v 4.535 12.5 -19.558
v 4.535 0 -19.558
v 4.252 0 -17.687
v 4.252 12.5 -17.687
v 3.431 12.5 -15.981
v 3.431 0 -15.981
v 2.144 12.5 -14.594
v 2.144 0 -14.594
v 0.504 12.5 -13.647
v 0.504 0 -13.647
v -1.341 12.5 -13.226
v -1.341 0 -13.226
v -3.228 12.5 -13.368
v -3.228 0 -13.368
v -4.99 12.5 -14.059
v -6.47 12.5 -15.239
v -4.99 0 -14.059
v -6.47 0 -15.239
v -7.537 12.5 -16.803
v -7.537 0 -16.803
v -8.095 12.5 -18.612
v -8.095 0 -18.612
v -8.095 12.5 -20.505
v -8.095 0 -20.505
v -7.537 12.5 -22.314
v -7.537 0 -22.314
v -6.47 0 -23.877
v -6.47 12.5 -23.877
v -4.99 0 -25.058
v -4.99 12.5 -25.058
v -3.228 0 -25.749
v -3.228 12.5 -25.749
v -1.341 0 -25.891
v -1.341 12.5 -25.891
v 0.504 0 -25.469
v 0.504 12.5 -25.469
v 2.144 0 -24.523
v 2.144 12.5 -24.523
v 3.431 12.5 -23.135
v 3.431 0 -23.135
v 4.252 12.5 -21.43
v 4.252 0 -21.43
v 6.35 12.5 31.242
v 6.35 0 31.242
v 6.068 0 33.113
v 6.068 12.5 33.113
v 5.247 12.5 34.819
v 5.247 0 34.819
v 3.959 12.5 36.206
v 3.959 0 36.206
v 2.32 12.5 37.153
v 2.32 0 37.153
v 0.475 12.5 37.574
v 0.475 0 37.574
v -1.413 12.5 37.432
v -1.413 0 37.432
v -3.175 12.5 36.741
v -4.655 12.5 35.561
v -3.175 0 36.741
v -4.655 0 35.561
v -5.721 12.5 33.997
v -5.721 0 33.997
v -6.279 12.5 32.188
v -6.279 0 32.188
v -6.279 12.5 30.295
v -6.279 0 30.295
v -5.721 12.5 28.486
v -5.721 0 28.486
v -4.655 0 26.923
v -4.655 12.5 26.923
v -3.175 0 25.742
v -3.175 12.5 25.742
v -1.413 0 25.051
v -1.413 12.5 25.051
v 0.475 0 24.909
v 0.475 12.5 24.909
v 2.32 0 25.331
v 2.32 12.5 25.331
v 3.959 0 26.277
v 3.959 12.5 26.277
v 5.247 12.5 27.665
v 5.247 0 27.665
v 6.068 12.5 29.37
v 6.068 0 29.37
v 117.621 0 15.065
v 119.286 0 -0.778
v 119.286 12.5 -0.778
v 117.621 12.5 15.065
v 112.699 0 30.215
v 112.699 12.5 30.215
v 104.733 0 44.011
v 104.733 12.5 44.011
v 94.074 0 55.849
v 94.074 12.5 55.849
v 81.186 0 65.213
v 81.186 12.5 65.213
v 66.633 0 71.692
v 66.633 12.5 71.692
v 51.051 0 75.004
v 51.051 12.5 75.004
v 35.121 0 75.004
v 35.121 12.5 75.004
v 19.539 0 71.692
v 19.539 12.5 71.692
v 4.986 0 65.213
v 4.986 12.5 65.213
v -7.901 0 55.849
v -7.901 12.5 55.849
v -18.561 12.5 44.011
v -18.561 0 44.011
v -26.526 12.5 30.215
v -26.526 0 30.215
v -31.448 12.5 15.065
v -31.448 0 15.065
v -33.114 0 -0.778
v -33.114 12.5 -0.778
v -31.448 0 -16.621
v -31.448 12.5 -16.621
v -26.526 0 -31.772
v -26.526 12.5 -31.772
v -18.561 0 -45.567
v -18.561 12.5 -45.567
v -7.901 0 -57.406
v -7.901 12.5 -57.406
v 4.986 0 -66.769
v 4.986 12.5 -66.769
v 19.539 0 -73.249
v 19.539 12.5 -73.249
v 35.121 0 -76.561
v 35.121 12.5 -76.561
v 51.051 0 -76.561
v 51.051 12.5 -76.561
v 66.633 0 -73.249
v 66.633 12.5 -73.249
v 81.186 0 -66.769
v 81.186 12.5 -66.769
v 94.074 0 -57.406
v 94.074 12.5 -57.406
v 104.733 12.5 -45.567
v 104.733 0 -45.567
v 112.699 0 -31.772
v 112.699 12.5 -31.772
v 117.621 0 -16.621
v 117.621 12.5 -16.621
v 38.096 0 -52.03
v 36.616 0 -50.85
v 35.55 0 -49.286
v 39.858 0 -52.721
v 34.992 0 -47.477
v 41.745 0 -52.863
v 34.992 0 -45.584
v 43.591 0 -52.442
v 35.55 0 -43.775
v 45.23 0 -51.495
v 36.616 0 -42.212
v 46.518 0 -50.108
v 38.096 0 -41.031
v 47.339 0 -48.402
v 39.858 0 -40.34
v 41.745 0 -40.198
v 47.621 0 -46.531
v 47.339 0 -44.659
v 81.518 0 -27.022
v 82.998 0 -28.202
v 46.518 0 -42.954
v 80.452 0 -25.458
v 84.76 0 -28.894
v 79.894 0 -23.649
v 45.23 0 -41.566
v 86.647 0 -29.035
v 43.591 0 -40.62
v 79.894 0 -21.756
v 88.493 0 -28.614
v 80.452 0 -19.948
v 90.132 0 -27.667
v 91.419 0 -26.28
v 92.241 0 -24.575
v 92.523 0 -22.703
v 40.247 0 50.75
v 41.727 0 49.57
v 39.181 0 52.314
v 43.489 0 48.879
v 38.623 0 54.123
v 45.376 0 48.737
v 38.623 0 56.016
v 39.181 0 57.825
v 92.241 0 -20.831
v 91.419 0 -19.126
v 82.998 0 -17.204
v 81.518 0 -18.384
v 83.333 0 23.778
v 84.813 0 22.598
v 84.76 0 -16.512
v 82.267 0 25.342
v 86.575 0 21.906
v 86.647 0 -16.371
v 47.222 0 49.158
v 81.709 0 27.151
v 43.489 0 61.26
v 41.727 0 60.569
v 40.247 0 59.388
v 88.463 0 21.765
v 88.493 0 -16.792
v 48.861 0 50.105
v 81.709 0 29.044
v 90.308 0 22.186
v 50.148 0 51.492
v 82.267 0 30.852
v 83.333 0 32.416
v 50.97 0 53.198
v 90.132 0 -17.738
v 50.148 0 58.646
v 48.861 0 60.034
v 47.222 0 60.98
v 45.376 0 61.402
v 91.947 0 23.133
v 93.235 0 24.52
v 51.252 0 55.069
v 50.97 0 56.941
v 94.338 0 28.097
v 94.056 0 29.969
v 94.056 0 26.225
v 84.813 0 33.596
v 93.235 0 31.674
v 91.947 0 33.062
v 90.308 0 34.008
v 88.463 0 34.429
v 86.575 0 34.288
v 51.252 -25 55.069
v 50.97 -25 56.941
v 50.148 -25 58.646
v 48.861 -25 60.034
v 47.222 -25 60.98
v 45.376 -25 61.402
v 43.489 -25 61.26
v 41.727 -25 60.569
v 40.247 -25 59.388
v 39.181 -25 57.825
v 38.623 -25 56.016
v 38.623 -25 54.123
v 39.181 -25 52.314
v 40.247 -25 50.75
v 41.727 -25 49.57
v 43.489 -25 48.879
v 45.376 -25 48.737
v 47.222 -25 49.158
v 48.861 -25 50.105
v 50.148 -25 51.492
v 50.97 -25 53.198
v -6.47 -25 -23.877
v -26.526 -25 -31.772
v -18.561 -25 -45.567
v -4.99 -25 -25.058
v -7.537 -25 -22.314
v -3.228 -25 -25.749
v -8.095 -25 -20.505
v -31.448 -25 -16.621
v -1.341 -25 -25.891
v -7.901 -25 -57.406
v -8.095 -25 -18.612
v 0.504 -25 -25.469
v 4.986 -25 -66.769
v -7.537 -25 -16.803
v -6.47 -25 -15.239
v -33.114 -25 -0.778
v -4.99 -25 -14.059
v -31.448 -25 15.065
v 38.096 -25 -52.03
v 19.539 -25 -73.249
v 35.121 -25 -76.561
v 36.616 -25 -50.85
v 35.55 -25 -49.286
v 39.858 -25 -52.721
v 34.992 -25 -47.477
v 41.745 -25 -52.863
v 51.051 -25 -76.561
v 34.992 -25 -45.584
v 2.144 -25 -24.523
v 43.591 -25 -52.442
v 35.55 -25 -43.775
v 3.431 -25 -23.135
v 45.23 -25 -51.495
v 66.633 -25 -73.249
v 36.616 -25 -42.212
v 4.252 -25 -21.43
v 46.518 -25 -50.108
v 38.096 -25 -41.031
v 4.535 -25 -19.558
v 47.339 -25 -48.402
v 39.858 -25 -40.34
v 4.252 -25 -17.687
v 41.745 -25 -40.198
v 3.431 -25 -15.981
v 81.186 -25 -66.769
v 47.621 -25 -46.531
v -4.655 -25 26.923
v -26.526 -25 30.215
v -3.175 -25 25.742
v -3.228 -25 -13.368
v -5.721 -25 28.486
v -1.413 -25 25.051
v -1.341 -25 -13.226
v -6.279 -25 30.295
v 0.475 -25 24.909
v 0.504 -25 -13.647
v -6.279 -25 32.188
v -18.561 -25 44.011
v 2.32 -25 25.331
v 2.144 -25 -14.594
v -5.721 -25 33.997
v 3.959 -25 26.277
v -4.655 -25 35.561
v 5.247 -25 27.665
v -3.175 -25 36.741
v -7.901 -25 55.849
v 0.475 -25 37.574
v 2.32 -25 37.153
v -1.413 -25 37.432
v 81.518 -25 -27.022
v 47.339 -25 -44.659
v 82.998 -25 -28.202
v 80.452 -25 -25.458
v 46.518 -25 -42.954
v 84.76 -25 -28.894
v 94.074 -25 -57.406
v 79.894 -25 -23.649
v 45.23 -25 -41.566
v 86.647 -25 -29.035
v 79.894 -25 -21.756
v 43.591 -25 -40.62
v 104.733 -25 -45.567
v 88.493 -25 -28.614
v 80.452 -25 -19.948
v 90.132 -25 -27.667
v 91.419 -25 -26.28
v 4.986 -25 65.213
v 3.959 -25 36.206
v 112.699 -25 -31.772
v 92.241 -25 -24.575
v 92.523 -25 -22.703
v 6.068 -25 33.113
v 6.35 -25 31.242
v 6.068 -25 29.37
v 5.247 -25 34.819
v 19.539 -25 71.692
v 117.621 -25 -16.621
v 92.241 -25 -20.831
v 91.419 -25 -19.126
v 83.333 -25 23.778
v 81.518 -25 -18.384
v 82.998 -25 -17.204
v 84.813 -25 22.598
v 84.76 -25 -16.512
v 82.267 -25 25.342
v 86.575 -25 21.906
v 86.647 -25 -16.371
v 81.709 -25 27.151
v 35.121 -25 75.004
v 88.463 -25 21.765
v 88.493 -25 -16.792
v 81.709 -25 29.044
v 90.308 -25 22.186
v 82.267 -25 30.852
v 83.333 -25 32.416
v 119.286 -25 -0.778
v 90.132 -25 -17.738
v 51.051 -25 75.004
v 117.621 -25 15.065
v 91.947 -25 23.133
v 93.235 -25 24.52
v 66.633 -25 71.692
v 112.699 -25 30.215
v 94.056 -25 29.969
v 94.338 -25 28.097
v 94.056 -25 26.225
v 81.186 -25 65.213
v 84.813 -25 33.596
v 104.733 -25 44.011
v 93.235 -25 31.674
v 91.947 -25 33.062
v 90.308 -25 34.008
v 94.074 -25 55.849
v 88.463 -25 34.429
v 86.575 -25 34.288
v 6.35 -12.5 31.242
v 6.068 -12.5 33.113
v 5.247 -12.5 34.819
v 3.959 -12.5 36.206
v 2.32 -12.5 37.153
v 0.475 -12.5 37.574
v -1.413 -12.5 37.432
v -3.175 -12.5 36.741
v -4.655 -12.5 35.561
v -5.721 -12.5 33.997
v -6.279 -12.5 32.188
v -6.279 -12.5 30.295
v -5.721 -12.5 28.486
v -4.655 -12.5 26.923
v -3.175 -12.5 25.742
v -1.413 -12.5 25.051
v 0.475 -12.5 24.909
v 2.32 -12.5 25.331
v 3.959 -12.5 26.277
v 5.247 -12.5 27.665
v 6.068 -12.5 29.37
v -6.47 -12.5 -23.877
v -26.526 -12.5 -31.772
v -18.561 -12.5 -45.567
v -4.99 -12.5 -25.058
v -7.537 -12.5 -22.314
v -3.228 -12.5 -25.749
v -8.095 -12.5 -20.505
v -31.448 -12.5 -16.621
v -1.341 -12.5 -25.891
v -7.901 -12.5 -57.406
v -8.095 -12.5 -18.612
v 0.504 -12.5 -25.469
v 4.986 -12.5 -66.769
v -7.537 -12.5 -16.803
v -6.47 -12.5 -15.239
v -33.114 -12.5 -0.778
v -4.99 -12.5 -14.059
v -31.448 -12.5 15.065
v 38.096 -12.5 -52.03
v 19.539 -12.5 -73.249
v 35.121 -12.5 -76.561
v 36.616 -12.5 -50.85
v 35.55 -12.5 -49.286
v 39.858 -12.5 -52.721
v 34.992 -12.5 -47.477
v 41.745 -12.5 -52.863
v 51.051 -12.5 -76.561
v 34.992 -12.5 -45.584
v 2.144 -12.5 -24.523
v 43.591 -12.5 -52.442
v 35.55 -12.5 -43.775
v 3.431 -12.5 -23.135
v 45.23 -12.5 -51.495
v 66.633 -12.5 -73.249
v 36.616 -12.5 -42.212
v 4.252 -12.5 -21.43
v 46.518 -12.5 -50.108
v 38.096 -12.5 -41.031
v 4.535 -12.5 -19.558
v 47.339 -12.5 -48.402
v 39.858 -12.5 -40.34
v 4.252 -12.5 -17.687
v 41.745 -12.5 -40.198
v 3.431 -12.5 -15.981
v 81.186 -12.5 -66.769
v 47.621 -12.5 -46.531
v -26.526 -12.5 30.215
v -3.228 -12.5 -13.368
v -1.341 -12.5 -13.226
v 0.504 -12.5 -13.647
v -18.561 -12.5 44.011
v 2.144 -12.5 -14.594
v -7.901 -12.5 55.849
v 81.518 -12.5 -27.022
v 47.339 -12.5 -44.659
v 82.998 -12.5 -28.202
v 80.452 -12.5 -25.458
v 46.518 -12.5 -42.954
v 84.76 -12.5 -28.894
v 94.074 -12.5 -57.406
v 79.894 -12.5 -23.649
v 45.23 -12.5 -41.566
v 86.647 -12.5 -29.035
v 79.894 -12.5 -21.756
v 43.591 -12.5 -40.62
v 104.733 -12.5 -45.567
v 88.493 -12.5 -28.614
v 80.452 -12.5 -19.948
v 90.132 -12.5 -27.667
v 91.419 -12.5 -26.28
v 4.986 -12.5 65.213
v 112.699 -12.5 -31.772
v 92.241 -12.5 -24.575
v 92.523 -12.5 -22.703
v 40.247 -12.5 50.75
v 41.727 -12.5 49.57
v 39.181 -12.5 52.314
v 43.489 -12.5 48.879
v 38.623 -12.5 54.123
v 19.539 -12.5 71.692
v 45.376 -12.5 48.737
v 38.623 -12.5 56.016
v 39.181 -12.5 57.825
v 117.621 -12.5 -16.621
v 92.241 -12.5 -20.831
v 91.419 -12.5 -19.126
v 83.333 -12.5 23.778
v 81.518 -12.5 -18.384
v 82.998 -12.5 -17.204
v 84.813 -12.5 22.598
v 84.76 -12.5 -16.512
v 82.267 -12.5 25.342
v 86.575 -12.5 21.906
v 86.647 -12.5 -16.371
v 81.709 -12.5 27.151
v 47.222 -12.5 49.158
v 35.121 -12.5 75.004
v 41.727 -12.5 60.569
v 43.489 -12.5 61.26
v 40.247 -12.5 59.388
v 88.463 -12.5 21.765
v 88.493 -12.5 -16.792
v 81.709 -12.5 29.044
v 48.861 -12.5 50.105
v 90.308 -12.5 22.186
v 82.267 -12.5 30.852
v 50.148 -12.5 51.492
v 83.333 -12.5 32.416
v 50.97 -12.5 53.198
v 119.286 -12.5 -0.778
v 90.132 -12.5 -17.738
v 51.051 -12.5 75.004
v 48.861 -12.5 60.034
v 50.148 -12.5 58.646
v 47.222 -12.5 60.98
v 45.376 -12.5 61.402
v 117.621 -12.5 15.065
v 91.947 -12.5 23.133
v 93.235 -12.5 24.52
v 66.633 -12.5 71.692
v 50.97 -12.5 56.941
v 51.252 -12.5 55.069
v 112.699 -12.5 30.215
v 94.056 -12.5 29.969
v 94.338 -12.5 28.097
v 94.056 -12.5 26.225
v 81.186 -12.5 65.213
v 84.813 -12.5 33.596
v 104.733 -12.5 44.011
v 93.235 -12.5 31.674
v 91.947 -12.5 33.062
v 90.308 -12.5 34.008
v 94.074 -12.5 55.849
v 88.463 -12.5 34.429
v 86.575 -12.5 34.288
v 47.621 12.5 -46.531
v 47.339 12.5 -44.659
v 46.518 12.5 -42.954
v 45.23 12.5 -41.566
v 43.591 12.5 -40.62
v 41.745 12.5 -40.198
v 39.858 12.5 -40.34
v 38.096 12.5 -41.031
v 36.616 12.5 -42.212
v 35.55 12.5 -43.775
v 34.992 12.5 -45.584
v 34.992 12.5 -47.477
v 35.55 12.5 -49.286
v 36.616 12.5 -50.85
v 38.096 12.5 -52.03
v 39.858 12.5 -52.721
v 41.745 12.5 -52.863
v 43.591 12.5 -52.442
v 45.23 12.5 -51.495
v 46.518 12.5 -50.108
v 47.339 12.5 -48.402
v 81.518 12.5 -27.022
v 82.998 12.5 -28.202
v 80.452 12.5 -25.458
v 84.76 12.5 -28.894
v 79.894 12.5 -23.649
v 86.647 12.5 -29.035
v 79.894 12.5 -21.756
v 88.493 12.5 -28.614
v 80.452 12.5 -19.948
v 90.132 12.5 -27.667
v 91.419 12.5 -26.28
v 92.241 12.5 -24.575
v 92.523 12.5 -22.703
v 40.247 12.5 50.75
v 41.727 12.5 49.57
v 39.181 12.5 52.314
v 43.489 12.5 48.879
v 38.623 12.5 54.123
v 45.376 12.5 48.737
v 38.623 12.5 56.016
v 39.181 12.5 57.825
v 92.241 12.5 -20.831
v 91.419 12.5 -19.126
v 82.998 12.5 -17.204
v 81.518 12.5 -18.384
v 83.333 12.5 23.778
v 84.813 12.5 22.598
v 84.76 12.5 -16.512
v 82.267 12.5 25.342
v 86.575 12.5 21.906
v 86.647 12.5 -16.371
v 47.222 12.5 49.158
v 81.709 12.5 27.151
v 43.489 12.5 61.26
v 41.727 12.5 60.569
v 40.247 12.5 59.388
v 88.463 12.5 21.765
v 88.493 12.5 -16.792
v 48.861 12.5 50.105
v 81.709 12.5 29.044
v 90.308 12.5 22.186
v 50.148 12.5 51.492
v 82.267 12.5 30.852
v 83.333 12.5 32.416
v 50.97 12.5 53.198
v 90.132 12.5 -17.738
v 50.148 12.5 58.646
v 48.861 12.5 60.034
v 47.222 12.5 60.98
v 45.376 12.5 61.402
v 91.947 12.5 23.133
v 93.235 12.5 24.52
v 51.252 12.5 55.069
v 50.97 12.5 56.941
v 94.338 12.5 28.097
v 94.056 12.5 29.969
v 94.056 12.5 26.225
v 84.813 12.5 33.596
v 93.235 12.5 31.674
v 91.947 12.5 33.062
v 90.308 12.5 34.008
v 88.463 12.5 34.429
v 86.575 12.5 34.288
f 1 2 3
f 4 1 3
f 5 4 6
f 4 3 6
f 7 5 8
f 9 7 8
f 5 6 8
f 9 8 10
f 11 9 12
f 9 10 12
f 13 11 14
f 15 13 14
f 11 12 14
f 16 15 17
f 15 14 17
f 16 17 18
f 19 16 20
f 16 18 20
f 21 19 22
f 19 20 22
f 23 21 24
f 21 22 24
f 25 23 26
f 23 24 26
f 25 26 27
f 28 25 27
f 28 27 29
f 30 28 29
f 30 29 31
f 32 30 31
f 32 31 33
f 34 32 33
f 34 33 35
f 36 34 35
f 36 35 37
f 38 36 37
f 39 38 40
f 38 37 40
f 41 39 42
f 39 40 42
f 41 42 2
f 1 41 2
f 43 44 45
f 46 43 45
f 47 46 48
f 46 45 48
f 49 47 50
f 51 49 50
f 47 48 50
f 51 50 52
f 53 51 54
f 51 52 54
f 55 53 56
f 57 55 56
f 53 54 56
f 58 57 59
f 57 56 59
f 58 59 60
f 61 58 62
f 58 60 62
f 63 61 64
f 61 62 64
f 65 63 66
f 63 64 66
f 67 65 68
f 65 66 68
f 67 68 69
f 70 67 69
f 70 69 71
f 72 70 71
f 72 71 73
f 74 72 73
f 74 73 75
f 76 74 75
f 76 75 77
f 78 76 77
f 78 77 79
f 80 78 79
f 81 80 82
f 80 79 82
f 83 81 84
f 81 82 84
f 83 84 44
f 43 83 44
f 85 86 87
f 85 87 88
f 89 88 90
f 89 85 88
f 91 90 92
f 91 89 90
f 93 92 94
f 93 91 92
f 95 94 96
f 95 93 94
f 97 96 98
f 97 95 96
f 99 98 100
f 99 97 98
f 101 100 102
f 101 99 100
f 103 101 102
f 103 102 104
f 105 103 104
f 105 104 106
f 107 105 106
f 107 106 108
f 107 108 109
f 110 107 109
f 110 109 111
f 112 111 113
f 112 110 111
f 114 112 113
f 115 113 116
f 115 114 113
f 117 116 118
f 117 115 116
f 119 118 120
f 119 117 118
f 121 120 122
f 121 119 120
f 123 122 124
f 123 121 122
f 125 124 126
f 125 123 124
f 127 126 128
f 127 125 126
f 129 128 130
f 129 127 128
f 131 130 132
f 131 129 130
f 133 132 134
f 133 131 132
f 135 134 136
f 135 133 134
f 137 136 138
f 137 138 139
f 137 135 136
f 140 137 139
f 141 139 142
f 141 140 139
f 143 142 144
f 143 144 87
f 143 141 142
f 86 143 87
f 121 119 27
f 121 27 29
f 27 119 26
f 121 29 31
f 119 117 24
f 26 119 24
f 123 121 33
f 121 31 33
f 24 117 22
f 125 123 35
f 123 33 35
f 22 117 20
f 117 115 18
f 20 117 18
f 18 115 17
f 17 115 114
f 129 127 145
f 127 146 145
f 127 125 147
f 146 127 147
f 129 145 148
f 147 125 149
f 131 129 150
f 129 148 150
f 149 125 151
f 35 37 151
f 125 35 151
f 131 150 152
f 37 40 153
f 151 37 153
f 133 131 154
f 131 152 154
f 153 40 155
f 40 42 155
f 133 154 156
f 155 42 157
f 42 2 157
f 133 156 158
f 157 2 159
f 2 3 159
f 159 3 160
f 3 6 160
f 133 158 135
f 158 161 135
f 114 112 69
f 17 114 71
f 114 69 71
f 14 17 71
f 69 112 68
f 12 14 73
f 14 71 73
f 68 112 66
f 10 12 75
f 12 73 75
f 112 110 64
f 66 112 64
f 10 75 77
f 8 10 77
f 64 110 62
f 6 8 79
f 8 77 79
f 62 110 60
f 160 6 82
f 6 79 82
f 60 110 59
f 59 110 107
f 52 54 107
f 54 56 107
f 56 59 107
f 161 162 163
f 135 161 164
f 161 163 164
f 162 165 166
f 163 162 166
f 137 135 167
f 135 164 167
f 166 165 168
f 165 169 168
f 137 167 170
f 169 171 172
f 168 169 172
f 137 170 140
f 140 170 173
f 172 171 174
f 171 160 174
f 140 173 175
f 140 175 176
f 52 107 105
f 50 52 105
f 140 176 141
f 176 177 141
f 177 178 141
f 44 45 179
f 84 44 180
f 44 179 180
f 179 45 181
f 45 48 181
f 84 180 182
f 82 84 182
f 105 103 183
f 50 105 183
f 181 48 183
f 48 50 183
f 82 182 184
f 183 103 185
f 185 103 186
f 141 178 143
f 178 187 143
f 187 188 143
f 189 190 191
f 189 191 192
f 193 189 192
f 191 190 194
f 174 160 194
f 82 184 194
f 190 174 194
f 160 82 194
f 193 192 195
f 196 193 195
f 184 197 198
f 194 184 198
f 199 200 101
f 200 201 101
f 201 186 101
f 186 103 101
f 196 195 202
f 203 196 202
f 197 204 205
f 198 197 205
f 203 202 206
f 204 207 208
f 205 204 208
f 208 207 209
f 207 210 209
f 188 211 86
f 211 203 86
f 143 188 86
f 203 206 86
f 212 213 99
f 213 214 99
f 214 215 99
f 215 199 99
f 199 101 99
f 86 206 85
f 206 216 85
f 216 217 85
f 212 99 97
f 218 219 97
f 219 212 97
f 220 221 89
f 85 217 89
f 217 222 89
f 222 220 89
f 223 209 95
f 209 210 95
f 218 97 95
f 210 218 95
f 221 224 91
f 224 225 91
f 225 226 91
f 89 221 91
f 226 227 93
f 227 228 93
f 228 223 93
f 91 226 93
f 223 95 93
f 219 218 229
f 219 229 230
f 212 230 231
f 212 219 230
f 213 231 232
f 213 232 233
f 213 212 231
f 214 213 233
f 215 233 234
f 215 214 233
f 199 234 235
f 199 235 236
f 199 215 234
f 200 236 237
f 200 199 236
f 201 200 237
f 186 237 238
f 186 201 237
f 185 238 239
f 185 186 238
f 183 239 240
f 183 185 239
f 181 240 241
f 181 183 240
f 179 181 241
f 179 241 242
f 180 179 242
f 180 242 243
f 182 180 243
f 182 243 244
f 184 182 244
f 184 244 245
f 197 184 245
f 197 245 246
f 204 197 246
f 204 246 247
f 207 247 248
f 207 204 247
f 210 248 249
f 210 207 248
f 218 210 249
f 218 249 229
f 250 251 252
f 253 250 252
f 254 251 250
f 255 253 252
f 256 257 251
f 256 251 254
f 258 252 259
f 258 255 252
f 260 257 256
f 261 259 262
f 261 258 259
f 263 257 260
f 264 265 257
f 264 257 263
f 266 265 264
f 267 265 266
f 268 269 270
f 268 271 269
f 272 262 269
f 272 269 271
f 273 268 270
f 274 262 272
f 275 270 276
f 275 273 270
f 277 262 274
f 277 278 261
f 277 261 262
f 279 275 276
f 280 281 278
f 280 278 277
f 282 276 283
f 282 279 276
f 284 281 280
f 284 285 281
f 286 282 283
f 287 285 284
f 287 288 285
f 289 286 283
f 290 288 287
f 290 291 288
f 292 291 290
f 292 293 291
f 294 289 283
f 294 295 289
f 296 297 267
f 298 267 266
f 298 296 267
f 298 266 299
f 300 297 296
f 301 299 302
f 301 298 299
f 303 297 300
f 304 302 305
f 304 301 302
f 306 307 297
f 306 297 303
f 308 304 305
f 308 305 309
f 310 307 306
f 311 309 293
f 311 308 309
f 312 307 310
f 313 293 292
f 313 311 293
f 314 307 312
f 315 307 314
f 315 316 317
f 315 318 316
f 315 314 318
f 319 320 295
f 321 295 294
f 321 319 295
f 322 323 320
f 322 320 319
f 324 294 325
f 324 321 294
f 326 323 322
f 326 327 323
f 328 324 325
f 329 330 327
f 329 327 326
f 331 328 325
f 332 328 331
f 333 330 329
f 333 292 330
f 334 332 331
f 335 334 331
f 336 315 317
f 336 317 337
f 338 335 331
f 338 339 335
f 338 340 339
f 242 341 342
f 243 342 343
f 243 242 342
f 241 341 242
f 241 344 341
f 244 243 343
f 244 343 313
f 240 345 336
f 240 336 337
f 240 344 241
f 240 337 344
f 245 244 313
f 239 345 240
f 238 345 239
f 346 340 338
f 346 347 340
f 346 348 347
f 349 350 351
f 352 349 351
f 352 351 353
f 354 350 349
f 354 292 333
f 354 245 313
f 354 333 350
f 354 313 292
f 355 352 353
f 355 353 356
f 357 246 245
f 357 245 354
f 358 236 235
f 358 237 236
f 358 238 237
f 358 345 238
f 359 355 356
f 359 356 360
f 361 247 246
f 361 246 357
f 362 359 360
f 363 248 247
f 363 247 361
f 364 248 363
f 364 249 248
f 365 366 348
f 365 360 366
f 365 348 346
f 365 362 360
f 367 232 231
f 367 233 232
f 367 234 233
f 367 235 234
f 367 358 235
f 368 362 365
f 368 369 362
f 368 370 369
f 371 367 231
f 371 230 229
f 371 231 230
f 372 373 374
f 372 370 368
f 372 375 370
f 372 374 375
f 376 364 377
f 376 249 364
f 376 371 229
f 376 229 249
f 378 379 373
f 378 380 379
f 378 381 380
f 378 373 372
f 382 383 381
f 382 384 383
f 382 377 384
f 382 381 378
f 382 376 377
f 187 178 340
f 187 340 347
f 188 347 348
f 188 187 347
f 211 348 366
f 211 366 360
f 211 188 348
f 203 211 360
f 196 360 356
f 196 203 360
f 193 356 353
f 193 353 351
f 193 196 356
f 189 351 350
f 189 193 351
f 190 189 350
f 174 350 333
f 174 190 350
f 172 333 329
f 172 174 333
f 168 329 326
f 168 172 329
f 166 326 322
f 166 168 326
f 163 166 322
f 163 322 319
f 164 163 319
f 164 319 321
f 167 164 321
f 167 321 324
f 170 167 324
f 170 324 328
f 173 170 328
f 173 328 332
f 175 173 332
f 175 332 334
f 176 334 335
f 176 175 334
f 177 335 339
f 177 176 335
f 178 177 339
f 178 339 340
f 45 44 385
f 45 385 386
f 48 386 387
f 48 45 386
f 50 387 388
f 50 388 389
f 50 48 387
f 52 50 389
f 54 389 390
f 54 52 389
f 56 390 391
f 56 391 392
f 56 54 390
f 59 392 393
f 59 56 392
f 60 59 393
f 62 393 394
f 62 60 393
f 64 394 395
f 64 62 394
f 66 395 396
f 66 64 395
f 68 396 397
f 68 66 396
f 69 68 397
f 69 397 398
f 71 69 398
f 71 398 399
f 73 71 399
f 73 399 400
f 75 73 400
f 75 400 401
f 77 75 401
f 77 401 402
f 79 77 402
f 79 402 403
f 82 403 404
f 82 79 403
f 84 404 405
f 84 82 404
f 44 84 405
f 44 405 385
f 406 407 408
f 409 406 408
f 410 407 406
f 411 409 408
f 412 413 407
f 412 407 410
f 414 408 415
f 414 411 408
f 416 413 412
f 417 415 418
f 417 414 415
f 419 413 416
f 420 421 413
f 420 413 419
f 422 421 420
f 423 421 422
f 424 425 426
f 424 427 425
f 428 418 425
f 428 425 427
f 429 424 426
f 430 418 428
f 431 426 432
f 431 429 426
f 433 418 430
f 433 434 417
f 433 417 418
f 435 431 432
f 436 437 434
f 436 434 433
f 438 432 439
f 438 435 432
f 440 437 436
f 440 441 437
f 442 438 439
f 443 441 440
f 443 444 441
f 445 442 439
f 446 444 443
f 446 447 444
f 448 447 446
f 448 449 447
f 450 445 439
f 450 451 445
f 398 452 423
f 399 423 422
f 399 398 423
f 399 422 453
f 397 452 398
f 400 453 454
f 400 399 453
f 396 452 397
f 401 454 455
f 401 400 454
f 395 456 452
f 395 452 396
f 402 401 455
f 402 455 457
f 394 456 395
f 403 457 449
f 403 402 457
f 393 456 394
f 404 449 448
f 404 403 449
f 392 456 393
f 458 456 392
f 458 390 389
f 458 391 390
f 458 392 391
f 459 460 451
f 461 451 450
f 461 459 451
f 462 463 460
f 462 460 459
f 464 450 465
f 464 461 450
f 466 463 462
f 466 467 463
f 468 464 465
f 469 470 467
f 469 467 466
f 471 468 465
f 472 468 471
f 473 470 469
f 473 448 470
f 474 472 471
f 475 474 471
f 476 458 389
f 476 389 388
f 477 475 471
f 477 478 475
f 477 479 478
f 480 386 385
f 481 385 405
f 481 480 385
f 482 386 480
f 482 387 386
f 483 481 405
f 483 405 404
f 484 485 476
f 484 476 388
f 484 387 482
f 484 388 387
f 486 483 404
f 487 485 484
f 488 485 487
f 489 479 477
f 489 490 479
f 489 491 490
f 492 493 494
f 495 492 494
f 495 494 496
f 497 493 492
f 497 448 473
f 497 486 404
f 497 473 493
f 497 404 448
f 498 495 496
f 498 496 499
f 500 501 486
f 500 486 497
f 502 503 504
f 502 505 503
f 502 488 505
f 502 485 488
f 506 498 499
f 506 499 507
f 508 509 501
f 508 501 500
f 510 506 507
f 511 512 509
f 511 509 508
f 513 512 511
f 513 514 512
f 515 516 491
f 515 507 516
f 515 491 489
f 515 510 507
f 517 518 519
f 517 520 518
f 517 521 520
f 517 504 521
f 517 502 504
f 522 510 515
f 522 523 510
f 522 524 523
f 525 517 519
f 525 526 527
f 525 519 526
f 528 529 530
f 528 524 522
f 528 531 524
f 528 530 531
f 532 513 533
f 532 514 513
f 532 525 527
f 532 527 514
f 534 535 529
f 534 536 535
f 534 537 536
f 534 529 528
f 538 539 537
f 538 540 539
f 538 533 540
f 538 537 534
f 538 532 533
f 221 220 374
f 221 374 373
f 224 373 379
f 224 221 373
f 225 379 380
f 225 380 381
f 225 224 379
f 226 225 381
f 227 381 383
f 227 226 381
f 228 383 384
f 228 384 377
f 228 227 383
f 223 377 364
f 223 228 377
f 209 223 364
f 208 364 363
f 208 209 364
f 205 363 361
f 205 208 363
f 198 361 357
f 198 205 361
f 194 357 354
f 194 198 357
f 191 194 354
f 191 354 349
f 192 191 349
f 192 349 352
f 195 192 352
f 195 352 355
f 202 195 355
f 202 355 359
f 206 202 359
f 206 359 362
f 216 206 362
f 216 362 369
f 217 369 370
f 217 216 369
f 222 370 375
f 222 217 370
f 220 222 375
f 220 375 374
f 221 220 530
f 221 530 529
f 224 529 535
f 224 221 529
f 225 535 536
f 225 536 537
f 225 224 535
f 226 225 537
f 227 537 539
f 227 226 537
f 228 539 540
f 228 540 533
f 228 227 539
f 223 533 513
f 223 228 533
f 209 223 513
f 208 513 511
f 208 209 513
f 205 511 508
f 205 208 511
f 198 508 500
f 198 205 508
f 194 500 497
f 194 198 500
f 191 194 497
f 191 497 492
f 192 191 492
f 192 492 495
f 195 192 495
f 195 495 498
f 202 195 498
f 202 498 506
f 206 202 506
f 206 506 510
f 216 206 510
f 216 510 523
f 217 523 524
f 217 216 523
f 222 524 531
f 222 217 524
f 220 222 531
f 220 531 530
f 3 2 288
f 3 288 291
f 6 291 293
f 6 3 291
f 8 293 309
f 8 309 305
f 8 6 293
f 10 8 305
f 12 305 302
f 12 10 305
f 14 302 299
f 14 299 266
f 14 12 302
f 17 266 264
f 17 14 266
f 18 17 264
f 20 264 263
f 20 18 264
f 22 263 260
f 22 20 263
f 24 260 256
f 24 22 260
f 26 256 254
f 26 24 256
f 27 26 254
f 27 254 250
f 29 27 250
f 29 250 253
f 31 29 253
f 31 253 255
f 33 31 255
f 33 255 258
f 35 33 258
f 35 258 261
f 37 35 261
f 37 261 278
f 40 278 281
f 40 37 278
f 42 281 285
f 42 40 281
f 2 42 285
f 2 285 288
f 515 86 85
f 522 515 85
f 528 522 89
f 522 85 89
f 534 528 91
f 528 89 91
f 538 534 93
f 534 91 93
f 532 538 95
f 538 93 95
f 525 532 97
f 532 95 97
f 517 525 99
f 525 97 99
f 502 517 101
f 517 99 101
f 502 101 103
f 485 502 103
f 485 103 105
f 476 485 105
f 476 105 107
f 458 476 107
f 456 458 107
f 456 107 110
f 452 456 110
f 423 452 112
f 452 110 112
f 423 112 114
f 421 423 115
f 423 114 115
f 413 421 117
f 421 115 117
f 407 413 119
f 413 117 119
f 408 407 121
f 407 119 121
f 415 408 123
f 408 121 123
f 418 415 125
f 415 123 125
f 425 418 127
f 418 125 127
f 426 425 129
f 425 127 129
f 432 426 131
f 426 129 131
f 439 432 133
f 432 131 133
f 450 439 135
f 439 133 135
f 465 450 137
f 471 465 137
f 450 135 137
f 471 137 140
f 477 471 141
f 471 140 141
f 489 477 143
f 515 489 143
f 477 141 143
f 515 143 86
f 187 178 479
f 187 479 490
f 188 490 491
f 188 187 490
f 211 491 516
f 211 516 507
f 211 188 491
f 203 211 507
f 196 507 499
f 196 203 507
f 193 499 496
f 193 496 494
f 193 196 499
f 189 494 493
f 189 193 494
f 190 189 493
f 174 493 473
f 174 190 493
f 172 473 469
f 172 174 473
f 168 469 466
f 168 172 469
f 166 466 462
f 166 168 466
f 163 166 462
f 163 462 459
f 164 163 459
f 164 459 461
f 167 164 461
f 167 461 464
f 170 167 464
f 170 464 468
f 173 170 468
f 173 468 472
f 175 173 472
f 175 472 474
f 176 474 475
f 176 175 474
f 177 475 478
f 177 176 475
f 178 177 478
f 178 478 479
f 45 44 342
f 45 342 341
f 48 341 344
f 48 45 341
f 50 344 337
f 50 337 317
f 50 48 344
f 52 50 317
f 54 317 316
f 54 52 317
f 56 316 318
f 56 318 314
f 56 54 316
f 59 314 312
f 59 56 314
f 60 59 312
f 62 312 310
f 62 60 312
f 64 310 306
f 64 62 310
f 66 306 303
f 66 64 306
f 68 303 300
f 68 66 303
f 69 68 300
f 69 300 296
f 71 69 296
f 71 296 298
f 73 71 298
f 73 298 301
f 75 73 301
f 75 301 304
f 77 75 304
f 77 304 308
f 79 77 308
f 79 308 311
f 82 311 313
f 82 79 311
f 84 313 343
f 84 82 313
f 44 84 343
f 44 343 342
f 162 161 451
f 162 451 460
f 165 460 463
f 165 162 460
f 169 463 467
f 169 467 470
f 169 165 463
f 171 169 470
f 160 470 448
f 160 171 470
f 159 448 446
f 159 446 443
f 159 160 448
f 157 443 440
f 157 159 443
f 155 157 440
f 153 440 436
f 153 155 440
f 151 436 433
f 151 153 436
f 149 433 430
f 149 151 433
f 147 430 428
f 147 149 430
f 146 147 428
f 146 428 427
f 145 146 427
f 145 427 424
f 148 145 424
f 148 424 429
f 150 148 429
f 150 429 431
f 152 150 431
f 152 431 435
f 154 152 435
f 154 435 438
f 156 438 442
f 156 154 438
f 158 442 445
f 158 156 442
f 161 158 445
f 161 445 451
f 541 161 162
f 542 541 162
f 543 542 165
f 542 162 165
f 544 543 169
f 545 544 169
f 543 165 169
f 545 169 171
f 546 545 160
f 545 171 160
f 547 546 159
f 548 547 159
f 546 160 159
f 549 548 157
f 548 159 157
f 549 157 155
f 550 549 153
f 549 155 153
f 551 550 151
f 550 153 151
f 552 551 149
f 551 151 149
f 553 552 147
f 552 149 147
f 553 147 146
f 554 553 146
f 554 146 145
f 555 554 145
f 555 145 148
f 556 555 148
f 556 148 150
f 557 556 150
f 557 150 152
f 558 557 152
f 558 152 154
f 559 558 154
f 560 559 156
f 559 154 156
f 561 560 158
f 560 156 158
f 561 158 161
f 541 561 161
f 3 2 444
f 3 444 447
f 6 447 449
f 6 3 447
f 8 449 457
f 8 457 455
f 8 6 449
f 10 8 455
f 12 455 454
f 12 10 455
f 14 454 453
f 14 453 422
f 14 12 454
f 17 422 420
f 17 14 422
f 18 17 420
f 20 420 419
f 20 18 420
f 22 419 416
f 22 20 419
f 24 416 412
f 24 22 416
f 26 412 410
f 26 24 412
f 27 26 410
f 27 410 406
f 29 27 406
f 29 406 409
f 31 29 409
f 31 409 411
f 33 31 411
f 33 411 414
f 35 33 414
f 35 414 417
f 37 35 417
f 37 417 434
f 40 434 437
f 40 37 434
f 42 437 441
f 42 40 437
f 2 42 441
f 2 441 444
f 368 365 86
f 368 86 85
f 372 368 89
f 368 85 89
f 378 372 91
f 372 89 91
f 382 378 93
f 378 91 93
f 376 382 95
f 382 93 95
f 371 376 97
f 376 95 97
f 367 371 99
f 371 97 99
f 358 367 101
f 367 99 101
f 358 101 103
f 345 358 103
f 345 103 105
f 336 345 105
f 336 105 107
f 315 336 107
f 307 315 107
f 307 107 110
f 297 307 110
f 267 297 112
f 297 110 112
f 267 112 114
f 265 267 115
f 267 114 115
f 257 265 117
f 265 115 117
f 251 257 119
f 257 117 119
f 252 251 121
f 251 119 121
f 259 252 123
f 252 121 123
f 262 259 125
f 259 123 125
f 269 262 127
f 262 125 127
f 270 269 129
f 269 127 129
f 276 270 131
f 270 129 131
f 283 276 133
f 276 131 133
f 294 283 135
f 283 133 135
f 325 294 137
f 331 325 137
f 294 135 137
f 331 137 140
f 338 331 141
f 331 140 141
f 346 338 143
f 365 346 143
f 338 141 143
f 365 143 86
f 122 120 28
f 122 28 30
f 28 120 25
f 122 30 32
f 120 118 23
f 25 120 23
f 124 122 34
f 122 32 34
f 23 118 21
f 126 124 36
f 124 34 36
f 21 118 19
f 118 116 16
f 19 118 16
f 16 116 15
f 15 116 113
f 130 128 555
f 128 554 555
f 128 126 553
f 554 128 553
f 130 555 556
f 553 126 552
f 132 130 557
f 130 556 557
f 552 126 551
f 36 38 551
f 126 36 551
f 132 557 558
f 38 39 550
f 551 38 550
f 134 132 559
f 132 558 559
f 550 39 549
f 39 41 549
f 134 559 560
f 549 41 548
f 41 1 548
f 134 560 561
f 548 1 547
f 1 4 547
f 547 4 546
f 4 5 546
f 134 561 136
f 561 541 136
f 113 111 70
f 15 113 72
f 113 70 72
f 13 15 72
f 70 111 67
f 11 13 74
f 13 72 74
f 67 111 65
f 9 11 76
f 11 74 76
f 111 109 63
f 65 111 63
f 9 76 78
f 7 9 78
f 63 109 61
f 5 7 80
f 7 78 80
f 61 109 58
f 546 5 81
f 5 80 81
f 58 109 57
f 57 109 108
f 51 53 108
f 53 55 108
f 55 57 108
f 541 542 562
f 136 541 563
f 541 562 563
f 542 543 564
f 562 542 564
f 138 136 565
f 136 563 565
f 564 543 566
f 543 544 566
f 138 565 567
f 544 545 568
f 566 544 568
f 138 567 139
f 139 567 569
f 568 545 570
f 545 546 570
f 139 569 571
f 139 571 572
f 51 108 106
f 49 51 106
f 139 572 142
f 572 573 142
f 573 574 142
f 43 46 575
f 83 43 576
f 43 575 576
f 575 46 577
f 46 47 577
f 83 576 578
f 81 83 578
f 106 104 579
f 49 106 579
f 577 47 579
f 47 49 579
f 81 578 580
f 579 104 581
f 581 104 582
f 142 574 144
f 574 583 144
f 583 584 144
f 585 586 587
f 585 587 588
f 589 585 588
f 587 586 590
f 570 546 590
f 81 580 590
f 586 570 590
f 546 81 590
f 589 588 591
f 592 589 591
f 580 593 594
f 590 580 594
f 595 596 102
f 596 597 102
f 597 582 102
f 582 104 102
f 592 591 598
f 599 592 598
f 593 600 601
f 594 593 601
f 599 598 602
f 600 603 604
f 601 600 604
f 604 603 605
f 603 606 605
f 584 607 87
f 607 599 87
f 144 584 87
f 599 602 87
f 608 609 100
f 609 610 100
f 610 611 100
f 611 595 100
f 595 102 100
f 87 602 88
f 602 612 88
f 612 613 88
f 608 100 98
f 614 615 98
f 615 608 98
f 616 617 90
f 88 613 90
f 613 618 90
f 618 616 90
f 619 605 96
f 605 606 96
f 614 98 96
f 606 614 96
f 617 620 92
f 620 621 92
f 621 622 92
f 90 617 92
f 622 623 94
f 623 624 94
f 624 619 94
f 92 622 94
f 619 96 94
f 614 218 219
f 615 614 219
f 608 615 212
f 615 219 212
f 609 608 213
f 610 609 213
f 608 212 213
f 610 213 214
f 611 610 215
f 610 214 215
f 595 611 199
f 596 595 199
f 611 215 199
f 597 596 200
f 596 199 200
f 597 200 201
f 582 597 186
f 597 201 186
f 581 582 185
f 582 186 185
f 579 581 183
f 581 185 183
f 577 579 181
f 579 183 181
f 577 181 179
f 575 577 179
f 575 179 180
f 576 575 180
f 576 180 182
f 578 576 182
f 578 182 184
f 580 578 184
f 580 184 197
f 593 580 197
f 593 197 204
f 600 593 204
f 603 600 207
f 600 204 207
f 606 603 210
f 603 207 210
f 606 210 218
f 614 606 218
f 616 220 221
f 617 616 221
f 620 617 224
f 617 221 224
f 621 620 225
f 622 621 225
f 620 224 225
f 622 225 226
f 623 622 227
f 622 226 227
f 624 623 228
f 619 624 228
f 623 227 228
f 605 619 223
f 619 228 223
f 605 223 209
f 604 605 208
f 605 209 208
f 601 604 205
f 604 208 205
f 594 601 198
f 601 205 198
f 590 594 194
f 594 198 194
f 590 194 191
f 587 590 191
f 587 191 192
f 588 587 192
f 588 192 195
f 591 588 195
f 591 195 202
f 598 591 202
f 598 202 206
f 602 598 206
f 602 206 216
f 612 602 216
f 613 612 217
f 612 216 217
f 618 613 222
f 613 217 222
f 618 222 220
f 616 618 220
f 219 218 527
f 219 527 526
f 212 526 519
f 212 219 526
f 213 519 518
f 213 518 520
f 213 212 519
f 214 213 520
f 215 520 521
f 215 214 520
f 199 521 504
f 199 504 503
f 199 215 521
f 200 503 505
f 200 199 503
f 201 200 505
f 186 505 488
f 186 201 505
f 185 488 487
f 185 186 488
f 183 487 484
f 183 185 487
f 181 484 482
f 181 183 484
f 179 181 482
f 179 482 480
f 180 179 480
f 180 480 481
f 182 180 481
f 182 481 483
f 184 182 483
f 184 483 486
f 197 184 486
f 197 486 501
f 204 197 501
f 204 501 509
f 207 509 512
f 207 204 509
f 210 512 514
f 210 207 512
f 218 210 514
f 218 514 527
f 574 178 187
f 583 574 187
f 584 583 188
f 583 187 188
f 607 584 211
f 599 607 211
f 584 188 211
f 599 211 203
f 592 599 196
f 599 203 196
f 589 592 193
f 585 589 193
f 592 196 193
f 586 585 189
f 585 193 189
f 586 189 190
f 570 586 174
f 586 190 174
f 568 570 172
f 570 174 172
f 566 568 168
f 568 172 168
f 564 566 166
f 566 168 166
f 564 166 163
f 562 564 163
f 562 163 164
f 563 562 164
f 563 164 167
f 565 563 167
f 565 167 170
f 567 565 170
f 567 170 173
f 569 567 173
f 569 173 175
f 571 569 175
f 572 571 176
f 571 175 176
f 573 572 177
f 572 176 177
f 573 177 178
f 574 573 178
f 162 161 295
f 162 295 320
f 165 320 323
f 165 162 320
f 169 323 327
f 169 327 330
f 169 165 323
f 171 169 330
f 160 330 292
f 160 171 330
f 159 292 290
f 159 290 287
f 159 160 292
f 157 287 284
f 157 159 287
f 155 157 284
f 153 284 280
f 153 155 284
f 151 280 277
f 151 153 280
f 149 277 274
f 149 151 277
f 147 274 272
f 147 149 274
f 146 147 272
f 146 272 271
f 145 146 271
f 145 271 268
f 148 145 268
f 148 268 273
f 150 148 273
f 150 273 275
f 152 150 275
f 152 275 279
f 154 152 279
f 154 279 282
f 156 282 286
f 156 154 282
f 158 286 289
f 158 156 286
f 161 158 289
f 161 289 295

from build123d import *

# Parameters (mm, degrees)
F0_R     = 76.2
F0_R_2   = 6.35
F2_DEPTH = 25
F3_DEPTH = 12.5


with BuildPart() as f2:
    # F0 (on Front) → F2 (new body)
    with BuildSketch(Plane.XZ):
        with Locations((43.0863654652, -0.778224063)):
            Circle(F0_R)
        with Locations((41.2709153712, -46.5305998541)):
            Circle(F0_R_2, mode=Mode.SUBTRACT)
        with Locations((-1.8154500941, -19.5583739534)):
            Circle(F0_R_2, mode=Mode.SUBTRACT)
        with Locations((86.1727309304, -22.7028257549)):
            Circle(F0_R_2, mode=Mode.SUBTRACT)
        with Locations((0, 31.2416260466)):
            Circle(F0_R_2, mode=Mode.SUBTRACT)
        with Locations((87.9881810245, 28.0971742451)):
            Circle(F0_R_2, mode=Mode.SUBTRACT)
        with Locations((44.9018155593, 55.0694001459)):
            Circle(F0_R_2, mode=Mode.SUBTRACT)
    extrude(amount=F2_DEPTH)


with BuildPart() as f3:
    # F3 (new, symmetric): a face of the model
    f3_faces = [f2.part.faces().sort_by_distance(p)[0] for p in [
        (43.0863654652, 0, -0.9976859851),
    ]]
    extrude(f3_faces, amount=F3_DEPTH, both=True)


solid = Compound([f2.part, f3.part])
